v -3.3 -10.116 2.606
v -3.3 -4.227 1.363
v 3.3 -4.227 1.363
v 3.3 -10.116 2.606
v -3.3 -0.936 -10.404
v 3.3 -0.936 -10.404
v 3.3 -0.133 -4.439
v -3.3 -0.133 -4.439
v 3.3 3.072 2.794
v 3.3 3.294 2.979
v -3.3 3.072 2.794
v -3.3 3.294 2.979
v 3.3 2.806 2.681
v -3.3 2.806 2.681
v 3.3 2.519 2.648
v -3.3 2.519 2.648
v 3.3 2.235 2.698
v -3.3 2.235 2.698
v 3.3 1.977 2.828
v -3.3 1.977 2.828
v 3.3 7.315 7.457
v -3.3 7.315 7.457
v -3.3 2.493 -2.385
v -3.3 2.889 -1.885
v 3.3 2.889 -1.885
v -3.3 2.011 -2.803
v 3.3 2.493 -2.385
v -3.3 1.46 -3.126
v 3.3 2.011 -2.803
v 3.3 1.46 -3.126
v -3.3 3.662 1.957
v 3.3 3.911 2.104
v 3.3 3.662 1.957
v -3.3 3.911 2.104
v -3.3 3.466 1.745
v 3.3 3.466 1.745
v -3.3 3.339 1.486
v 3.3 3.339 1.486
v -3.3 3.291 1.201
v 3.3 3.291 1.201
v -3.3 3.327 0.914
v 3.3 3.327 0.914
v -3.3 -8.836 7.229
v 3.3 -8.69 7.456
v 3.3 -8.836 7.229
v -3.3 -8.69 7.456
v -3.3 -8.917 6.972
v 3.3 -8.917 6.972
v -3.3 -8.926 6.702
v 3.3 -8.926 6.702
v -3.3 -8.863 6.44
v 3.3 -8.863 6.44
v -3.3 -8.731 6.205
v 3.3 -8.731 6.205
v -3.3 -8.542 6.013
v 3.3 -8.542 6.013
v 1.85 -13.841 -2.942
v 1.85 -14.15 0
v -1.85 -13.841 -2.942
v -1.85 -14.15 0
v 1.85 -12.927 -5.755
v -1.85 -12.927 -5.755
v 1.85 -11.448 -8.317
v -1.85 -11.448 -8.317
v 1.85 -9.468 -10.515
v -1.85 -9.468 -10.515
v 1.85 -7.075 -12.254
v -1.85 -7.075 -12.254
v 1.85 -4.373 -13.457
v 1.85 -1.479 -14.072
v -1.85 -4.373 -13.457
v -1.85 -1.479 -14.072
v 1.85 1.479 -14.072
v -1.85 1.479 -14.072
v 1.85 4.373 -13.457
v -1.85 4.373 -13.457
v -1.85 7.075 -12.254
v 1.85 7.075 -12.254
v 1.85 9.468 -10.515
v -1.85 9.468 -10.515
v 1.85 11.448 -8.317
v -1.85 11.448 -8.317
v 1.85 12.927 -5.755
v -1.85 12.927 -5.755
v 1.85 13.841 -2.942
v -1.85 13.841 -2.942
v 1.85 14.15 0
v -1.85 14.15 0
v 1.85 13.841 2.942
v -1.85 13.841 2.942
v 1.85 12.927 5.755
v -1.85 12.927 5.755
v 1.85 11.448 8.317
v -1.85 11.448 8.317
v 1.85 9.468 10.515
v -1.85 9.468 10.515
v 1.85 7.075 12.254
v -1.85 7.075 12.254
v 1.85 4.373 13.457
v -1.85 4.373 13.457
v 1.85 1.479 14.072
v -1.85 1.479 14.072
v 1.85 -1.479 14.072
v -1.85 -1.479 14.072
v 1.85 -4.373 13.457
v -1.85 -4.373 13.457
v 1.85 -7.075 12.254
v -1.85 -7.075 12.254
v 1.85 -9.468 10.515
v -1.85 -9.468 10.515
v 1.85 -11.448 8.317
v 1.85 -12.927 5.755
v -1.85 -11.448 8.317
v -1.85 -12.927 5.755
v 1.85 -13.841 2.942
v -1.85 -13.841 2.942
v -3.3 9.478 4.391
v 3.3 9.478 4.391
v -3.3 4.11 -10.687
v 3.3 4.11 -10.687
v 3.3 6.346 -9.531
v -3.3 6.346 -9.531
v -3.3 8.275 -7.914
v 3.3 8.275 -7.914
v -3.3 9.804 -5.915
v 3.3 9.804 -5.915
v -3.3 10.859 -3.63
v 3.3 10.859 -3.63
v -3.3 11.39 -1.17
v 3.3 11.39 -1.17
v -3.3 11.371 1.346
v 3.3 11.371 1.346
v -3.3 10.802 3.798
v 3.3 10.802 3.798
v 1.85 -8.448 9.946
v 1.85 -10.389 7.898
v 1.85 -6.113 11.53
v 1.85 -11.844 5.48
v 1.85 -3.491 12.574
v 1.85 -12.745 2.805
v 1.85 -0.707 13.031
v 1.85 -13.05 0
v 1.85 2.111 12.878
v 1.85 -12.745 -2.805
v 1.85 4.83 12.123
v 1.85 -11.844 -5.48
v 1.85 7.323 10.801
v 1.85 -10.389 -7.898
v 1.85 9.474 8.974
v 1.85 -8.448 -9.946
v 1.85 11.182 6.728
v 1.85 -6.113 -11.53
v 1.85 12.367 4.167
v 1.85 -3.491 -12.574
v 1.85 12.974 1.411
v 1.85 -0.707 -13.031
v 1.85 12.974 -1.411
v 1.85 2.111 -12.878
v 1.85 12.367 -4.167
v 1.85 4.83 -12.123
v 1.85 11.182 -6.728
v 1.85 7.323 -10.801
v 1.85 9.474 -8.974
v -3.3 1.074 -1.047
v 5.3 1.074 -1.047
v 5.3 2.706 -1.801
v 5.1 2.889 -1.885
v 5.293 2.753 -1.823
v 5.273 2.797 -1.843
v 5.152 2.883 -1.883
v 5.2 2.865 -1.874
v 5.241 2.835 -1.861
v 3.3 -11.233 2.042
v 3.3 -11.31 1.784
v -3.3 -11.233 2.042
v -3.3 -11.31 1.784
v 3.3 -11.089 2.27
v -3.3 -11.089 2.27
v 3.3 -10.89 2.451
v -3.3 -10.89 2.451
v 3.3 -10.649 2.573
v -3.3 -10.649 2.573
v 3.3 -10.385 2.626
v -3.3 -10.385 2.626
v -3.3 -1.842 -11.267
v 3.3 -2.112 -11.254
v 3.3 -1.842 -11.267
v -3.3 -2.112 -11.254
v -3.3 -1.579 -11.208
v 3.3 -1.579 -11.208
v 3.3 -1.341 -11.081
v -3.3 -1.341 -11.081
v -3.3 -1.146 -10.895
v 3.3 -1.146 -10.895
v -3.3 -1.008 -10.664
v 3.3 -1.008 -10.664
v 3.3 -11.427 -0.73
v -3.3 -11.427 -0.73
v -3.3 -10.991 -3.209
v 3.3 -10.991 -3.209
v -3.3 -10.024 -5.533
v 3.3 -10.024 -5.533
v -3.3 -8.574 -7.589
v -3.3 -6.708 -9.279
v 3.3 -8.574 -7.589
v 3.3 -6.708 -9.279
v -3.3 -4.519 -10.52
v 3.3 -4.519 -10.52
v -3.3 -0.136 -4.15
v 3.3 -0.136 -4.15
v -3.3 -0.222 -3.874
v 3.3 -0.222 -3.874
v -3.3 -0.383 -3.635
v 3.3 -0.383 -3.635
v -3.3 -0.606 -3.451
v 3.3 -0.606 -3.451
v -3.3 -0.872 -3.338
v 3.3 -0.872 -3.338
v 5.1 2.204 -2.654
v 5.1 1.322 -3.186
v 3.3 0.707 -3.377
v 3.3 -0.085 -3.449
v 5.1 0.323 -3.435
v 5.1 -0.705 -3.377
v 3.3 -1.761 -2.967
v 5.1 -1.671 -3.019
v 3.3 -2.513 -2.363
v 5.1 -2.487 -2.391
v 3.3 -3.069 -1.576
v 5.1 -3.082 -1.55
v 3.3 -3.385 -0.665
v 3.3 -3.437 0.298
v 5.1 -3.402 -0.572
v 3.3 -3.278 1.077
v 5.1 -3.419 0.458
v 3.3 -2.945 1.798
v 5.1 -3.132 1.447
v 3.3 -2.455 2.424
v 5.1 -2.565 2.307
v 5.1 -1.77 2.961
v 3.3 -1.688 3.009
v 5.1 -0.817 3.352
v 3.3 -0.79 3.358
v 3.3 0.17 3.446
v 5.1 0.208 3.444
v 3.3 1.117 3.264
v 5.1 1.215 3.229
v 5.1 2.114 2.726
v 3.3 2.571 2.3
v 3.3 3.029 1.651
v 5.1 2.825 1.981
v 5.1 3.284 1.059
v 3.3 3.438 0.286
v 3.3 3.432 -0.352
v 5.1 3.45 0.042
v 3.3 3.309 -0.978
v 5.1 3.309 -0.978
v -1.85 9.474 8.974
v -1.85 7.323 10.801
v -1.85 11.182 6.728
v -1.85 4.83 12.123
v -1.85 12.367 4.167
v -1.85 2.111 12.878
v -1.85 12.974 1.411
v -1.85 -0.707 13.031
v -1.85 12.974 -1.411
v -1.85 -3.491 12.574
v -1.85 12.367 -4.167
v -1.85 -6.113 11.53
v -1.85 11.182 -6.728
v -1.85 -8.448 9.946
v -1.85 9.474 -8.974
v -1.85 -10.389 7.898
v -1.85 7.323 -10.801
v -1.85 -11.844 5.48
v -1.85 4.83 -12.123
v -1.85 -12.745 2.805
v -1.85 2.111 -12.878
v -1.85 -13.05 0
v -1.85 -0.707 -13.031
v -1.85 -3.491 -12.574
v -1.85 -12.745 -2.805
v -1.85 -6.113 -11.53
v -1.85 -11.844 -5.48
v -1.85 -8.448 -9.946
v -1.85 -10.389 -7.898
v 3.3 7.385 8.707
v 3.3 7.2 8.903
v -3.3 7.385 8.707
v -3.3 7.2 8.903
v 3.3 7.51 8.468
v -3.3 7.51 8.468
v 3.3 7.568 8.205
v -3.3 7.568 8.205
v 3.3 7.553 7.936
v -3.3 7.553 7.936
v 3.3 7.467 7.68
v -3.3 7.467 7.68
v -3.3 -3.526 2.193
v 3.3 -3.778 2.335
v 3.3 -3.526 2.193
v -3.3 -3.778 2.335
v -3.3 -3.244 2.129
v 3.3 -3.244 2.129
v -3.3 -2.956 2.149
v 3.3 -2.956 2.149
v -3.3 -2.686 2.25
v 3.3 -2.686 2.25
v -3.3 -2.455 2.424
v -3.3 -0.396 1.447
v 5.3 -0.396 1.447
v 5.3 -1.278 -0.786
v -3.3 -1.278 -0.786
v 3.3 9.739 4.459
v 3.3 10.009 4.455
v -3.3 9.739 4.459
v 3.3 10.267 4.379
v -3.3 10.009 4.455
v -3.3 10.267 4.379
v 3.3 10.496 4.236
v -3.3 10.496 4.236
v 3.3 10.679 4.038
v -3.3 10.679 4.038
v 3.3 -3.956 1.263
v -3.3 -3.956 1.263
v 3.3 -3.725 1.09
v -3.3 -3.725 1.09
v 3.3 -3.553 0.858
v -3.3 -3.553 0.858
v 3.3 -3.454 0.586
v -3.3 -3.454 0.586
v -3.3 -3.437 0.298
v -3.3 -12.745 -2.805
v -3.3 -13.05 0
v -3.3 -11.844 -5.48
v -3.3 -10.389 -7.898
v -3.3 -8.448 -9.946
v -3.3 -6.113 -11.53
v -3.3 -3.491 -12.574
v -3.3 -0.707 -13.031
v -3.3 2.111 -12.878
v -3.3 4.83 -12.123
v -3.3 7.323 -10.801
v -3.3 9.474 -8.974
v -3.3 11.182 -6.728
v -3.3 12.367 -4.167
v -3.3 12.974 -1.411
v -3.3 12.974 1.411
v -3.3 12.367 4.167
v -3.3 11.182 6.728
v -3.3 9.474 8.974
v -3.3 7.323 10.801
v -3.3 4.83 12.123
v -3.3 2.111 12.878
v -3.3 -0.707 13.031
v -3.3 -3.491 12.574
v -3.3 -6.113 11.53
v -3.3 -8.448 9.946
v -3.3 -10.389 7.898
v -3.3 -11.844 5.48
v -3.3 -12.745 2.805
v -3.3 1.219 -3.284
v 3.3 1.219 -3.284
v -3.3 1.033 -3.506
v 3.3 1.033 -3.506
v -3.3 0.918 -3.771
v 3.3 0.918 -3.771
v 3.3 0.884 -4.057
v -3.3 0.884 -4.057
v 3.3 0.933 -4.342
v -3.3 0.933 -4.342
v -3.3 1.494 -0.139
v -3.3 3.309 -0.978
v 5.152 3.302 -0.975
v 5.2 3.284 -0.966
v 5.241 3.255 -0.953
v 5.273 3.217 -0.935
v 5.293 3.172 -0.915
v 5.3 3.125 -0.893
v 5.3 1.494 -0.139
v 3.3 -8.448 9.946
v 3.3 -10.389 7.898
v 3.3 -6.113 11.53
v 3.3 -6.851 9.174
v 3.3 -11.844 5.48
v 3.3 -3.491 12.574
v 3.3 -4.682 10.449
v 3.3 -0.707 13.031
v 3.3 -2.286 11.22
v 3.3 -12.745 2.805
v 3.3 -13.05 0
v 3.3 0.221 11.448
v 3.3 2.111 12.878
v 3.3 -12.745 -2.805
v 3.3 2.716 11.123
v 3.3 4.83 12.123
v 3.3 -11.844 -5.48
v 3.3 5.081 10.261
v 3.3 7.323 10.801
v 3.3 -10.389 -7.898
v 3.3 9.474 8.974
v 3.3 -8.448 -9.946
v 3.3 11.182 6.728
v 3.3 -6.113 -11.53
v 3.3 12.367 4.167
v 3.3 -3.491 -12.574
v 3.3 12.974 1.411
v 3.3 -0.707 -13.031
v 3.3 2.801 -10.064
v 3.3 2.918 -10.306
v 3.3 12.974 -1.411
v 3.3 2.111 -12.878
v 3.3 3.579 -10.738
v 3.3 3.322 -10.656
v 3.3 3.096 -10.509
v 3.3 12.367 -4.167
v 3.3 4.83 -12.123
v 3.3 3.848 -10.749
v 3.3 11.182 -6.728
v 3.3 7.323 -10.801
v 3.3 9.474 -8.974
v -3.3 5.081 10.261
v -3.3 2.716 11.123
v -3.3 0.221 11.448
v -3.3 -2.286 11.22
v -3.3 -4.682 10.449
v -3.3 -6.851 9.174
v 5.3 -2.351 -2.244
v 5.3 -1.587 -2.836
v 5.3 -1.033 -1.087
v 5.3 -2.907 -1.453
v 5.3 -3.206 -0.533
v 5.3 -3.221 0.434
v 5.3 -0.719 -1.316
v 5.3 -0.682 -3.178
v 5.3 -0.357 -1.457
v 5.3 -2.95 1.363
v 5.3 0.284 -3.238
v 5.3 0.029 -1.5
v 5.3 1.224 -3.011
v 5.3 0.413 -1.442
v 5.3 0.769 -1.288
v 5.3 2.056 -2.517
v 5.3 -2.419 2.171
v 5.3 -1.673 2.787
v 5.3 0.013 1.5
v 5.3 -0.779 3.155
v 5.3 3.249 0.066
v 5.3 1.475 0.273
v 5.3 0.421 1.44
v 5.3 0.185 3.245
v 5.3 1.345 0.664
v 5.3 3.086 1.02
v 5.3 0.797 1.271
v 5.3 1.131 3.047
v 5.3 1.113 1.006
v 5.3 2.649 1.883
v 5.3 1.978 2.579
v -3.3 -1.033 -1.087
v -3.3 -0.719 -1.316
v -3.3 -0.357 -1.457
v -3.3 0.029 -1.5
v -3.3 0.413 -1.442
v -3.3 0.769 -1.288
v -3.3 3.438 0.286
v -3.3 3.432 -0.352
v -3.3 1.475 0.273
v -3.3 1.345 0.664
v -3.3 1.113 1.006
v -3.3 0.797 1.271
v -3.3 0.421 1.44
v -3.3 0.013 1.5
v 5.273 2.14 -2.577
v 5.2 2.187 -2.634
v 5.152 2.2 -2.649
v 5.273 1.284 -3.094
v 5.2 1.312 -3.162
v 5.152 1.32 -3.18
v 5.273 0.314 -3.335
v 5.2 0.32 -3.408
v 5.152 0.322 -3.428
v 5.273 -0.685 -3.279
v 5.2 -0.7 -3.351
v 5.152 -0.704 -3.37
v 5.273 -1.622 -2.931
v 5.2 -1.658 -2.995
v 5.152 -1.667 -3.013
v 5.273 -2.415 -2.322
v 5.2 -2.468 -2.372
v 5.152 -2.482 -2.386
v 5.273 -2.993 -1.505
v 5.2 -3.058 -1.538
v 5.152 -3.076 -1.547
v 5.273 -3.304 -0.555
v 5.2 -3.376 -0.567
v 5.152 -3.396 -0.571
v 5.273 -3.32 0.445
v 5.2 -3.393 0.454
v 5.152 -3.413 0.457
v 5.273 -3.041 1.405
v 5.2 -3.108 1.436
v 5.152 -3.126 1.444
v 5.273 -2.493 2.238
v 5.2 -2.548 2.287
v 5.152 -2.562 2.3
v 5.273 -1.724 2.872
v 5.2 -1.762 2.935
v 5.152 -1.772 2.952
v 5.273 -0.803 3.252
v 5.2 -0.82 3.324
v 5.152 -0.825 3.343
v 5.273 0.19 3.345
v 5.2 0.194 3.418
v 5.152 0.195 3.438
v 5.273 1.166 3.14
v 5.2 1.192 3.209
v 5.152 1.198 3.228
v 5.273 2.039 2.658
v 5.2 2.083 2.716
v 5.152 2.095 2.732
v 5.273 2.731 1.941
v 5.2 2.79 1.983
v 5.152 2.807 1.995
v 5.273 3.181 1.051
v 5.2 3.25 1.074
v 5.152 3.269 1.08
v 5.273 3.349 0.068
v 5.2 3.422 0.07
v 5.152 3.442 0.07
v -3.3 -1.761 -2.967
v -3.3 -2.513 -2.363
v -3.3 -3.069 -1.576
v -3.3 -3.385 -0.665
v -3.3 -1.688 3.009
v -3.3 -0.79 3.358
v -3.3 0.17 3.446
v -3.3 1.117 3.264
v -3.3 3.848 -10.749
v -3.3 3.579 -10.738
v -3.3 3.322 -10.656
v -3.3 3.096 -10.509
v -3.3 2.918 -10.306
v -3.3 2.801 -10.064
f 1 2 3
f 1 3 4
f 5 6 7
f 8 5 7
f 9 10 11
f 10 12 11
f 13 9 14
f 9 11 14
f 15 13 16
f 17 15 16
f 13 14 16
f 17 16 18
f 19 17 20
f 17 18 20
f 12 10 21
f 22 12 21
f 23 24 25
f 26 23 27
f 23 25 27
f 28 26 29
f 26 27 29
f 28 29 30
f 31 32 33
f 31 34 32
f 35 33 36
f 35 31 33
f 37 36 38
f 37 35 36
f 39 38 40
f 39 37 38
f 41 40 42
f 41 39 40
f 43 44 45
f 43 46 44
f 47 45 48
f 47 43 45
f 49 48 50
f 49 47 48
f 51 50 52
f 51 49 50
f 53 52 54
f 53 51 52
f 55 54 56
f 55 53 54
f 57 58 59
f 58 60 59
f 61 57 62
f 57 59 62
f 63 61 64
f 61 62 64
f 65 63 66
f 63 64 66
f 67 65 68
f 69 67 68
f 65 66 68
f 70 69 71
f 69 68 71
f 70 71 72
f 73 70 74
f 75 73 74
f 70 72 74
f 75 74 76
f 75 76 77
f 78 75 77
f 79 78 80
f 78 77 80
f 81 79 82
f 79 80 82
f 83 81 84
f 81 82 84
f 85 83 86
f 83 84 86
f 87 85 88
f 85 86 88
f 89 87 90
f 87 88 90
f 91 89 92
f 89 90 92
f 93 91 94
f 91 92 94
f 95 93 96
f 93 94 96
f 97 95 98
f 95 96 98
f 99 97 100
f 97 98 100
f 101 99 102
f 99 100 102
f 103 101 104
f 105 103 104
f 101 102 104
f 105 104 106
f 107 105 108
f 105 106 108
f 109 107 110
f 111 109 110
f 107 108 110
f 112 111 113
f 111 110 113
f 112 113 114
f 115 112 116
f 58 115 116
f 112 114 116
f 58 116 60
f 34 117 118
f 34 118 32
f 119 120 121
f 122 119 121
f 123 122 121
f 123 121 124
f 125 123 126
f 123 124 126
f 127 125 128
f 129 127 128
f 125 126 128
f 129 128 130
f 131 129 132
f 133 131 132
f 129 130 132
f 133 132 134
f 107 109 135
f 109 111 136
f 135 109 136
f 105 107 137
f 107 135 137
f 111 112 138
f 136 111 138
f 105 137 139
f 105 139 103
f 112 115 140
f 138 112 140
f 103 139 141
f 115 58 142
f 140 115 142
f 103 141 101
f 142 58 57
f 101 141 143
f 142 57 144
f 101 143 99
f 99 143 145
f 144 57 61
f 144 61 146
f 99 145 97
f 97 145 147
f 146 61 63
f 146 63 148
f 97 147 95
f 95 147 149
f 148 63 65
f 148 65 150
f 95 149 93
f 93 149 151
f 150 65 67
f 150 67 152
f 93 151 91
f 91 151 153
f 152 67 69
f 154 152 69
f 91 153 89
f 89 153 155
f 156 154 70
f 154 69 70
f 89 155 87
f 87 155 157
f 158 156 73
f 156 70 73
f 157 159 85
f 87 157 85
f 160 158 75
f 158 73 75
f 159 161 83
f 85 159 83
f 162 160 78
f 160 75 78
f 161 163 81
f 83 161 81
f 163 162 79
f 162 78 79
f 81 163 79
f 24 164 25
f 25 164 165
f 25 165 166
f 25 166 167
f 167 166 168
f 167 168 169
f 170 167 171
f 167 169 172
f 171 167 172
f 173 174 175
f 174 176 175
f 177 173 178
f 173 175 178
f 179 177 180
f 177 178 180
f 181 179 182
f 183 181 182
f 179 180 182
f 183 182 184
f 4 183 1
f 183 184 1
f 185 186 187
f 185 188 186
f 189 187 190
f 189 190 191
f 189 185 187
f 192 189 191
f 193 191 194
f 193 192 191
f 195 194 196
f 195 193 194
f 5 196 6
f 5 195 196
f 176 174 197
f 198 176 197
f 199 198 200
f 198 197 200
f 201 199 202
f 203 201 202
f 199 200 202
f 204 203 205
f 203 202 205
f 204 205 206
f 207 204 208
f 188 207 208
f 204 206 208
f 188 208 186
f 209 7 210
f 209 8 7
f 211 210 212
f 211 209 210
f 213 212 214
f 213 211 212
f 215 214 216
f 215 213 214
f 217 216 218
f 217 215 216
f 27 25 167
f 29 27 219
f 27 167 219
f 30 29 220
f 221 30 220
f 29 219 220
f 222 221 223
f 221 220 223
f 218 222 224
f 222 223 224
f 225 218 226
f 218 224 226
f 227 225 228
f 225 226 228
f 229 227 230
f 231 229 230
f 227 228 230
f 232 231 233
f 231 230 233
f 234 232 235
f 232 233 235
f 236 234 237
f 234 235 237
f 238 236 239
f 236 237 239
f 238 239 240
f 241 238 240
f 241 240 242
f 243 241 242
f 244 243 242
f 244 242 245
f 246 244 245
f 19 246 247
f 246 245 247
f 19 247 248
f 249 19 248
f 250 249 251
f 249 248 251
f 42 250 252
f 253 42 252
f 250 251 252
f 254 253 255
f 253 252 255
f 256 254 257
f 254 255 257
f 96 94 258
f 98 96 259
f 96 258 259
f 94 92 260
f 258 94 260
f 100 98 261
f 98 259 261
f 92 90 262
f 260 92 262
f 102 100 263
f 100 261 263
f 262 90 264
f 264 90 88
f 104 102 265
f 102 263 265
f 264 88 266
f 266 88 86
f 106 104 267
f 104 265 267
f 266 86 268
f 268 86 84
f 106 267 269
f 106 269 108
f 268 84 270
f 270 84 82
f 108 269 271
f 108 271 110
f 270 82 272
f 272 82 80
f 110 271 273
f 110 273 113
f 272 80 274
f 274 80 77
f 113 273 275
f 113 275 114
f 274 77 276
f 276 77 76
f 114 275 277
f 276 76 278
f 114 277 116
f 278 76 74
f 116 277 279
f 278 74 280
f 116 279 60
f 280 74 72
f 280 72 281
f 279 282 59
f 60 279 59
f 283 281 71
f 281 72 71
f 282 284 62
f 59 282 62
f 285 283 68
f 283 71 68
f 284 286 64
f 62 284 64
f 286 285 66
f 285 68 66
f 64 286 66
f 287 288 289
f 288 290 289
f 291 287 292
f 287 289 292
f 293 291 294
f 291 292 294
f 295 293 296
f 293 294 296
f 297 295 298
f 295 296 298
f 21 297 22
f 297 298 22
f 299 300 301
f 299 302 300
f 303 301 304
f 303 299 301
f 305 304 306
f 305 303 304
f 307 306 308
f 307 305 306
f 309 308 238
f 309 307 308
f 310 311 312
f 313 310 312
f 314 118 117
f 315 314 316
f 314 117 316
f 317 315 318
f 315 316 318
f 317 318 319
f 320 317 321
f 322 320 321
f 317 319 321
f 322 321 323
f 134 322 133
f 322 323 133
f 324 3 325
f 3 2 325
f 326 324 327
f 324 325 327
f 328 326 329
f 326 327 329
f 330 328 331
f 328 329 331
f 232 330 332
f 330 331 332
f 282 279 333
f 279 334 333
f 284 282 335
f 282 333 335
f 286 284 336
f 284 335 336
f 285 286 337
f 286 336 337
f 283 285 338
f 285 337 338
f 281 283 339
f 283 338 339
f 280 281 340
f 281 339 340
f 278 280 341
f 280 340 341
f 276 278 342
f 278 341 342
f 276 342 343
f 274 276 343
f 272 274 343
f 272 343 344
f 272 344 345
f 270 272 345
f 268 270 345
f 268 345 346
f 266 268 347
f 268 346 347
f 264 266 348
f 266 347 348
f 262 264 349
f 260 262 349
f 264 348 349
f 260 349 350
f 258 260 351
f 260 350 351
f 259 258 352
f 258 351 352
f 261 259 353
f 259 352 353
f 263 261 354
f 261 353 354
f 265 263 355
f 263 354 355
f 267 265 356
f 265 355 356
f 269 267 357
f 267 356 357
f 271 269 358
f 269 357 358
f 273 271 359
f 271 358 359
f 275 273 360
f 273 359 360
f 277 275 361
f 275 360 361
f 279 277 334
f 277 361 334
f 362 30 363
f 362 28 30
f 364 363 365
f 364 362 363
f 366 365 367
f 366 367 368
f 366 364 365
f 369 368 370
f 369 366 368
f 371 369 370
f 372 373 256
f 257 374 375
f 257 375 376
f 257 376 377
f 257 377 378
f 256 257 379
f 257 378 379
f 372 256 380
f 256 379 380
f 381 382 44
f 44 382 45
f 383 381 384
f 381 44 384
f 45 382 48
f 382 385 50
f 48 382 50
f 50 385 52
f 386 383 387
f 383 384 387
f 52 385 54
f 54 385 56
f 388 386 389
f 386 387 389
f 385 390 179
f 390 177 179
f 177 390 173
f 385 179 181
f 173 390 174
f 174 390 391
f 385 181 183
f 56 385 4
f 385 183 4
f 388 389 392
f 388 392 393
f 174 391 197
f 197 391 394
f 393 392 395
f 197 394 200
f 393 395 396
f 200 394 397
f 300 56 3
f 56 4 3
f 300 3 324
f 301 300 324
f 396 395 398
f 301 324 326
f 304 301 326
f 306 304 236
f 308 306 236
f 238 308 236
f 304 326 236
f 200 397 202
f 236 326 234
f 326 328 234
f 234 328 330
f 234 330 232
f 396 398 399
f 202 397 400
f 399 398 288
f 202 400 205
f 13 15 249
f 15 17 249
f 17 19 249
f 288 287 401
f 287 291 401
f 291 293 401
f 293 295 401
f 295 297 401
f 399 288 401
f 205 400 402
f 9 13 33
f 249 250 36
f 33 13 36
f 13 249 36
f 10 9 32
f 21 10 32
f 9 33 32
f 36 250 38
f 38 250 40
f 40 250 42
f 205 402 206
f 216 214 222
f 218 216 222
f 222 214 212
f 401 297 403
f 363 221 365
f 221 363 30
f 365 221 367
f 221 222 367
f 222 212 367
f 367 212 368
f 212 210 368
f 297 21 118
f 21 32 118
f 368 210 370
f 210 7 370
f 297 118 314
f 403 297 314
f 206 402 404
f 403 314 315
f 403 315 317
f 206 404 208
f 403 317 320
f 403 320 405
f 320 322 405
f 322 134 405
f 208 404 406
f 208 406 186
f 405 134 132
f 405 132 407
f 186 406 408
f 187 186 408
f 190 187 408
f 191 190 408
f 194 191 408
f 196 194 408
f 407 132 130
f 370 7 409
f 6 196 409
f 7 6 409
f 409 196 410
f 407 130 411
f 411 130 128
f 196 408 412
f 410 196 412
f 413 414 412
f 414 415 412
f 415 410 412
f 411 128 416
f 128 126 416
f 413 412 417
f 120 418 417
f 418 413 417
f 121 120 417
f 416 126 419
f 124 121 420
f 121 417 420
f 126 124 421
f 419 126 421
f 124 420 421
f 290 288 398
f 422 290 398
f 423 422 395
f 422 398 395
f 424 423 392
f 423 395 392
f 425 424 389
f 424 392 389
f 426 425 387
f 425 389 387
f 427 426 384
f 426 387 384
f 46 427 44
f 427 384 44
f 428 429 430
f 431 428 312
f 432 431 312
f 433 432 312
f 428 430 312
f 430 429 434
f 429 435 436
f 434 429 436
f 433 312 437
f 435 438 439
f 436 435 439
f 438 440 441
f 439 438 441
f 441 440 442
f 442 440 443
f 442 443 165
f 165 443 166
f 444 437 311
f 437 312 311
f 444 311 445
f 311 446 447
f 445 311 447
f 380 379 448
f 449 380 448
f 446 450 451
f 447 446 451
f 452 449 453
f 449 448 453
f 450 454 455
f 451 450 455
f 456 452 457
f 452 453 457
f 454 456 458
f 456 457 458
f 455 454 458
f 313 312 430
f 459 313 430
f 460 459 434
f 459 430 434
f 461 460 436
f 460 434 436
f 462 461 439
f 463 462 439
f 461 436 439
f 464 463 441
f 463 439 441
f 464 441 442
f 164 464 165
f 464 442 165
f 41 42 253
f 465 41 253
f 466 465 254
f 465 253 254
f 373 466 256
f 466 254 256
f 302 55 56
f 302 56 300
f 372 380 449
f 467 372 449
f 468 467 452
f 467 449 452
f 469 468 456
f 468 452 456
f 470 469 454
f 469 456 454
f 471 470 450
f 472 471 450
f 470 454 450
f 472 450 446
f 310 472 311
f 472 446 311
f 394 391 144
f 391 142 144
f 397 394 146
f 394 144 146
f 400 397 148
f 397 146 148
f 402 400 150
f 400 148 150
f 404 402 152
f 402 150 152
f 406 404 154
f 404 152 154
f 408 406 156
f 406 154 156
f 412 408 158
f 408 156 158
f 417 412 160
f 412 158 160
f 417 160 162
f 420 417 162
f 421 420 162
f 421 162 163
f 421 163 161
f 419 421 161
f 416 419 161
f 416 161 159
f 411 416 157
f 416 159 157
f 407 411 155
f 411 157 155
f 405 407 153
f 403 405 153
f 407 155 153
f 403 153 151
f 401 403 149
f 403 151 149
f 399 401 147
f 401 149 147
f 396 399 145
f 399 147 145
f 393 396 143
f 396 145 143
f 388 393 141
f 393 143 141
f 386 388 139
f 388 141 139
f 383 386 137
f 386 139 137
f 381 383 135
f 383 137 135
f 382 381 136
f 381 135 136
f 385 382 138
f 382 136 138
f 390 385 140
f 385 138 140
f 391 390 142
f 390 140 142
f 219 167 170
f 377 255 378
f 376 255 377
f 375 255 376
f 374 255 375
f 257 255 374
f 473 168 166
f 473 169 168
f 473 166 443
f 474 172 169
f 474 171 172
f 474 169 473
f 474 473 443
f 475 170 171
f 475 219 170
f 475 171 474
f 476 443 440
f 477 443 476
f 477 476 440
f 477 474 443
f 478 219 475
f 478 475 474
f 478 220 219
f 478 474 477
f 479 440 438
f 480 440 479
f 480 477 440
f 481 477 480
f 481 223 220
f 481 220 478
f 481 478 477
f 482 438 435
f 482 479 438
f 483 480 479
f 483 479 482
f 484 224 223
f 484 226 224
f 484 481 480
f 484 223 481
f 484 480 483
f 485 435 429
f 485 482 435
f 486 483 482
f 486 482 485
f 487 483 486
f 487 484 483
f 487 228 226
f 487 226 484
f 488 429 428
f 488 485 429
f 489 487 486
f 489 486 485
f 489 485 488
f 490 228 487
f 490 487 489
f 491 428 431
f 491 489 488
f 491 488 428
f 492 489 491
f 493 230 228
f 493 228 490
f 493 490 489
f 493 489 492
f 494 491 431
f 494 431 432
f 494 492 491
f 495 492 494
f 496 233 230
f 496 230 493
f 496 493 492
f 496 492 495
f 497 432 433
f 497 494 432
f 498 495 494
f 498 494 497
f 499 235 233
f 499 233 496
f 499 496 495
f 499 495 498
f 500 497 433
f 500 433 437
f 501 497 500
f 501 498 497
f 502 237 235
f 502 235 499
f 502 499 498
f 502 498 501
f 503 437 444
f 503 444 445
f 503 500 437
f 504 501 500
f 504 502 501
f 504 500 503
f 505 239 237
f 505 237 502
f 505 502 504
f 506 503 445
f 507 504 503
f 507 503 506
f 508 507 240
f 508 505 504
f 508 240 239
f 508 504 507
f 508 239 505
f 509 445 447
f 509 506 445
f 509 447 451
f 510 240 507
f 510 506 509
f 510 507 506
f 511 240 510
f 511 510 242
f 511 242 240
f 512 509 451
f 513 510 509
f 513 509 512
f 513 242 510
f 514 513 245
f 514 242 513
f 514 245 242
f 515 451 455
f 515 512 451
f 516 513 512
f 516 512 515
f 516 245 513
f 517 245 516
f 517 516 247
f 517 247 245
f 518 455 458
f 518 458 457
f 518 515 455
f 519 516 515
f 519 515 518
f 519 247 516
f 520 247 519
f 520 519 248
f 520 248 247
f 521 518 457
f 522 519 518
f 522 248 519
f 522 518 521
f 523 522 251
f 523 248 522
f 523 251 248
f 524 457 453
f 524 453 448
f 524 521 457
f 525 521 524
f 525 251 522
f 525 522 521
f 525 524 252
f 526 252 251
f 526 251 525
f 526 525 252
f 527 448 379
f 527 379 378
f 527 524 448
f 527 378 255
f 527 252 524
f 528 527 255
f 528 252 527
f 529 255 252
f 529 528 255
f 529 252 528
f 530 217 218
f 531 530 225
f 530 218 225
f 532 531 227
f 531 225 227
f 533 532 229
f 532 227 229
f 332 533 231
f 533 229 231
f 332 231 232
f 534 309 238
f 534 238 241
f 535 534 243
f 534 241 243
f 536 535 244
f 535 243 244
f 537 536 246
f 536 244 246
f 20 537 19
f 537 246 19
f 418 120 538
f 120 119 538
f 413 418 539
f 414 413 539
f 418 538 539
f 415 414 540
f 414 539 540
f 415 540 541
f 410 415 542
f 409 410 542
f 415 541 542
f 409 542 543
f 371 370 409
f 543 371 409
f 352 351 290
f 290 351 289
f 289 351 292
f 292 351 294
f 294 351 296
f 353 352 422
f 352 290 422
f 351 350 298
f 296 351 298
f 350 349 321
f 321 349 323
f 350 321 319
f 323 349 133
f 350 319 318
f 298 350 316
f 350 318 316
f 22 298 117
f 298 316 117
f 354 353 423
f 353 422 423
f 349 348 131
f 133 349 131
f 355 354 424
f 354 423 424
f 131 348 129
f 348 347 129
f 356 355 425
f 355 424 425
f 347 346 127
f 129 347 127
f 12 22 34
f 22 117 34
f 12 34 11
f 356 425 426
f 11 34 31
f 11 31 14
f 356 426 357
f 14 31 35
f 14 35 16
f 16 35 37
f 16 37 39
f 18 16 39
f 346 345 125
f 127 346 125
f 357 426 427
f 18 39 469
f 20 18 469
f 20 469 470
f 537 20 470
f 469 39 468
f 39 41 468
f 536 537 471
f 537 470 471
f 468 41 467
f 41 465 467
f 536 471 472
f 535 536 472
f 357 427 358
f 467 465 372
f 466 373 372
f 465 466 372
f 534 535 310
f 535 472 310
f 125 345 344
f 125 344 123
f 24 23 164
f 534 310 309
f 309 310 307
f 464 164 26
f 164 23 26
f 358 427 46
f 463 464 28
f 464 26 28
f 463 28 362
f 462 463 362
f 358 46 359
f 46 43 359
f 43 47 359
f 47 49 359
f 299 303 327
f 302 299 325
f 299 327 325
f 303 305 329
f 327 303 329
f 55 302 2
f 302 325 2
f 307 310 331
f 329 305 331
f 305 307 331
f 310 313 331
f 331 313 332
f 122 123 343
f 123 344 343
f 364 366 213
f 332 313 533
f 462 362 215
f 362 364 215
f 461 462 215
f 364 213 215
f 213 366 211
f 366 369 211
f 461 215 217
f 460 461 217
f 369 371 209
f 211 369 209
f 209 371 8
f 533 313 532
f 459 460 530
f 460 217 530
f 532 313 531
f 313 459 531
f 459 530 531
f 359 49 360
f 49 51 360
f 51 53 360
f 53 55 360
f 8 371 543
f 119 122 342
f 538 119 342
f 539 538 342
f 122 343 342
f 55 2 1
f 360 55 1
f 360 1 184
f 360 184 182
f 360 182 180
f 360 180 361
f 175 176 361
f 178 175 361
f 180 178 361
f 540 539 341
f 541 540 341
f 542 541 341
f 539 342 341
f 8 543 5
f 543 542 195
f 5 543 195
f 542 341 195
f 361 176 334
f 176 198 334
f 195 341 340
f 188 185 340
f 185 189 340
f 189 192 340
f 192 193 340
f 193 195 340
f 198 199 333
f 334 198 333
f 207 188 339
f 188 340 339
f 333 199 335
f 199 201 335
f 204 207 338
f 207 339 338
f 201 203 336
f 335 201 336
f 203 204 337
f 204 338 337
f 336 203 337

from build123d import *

# Parameters (mm, degrees)
ODEBRAT_VYSUNUT_M1_DEPTH = 10
ZAOBLIT1_R               = 1
ZAOBLIT2_R               = 1
ZAOBLIT4_R               = 1
ODEBRAT_VYSUNUT_M2_DEPTH = 10
P_IDAT_START             = 2
P_IDAT_VYSUNUT_M1_DEPTH  = 2
ZAOBLIT5_R               = 0.2


with BuildPart() as part:
    # Skica1 → Rotovat1 (revolve)
    with BuildSketch(Plane.XY, mode=Mode.PRIVATE) as rotovat1_sk:
        Polygon((1.849988347, 14.15), (-1.849988347, 14.15), (-1.849988347, 13.05), (-3.3, 13.05), (-3.3, 0), (3.3, 0), (3.3, 13.05), (1.849988347, 13.05), align=None)
    revolve(rotovat1_sk.sketch.rotate(Axis((-3.3, 0, 0), (1, 0, 0)), 180), axis=Axis((-3.3, 0, 0), (1, 0, 0)))

    # Skica2 → Odebrat vysunutím1 (cut)
    with BuildSketch(Plane(origin=(3.3, 0, 0), x_dir=(0, 0, -1), z_dir=(1, 0, 0))):
        with BuildLine():
            ThreePointArc((-1.725, 2.987787643), (1.446819914, 3.131966177), (3.393206272, 0.623418956))
            Line((3.393206272, 0.623418956), (11.018835658, 3.112516786))
            ThreePointArc((11.018835658, 3.112516786), (4.801764642, 10.394496444), (-4.773151875, 10.407666462))
            Line((-4.773151875, 10.407666462), (-1.725, 2.987787643))
        make_face()
        with BuildLine():
            ThreePointArc((-1.725, -2.987787643), (-3.43577223, -0.313000288), (-2.236499789, 2.626893354))
            Line((-2.236499789, 2.626893354), (-8.204936435, 7.986333207))
            ThreePointArc((-8.204936435, 7.986333207), (-11.402780301, -1.038798059), (-6.626727613, -9.33750401))
            Line((-6.626727613, -9.33750401), (-1.725, -2.987787643))
        make_face()
        with BuildLine():
            Line((11.399879487, -1.070162452), (3.45, 0))
            ThreePointArc((3.45, 0), (1.988952316, -2.818965889), (-1.156706483, -3.25031231))
            Line((-1.156706483, -3.25031231), (-2.813899223, -11.098849993))
            ThreePointArc((-2.813899223, -11.098849993), (6.601015659, -9.355698385), (11.399879487, -1.070162452))
        make_face()
    extrude(amount=-ODEBRAT_VYSUNUT_M1_DEPTH, mode=Mode.SUBTRACT)

    # Zaoblit1
    zaoblit1_edges = [part.edges().sort_by_distance(p)[0] for p in [
        (0, 7.986333207, 8.204936435),
    ]]
    fillet(zaoblit1_edges, radius=ZAOBLIT1_R)

    # Zaoblit2
    zaoblit2_edges = [part.edges().sort_by_distance(p)[0] for p in [
        (0, 10.407666462, 4.773151875),
        (0, 3.112516786, -11.018835658),
        (0, -9.33750401, 6.626727613),
        (0, -1.070162452, -11.399879487),
        (0, -11.098849993, 2.813899223),
    ]]
    fillet(zaoblit2_edges, radius=ZAOBLIT2_R)

    # Zaoblit4
    zaoblit4_edges = [part.edges().sort_by_distance(p)[0] for p in [
        (0, 0.623418956, -3.393206272),
        (0, 2.987787643, 1.725),
        (0, 2.626893354, 2.236499789),
        (0, -2.987787643, 1.725),
        (0, -3.25031231, 1.156706483),
        (0, 0, -3.45),
    ]]
    fillet(zaoblit4_edges, radius=ZAOBLIT4_R)

    # Skica3 → Odebrat vysunutím2 (cut)
    with BuildSketch(Plane(origin=(3.3, 0, 0), x_dir=(0, 0, -1), z_dir=(1, 0, 0))):
        with BuildLine():
            Line((1.046984184, 1.074162054), (1.885452924, 2.889215684))
            ThreePointArc((1.885452924, 2.889215684), (1.446819914, 3.131966177), (0.977636641, 3.308583775))
            Line((0.977636641, 3.308583775), (0.1391679, 1.493530146))
            ThreePointArc((0.1391679, 1.493530146), (-1.149085352, 0.964159143), (-1.446658447, -0.396458495))
            Line((-1.446658447, -0.396458495), (0.78566452, -1.277783731))
            ThreePointArc((0.78566452, -1.277783731), (1.490826134, -0.165642502), (1.046984184, 1.074162054))
        make_face()
    extrude(amount=-ODEBRAT_VYSUNUT_M2_DEPTH, mode=Mode.SUBTRACT)

    # Skica5 → Přidat vysunutím1 (add)
    with BuildSketch(Plane(origin=(3.3, 0, 0), x_dir=(0, 0, -1), z_dir=(1, 0, 0)).offset(P_IDAT_START)):
        with BuildLine():
            Line((0.977636641, 3.308583775), (0.1391679, 1.493530146))
            ThreePointArc((0.1391679, 1.493530146), (-1.149085352, 0.964159143), (-1.446658447, -0.396458495))
            Line((-1.446658447, -0.396458495), (0.78566452, -1.277783731))
            ThreePointArc((0.78566452, -1.277783731), (1.490826134, -0.165642502), (1.046984184, 1.074162054))
            Line((1.046984184, 1.074162054), (1.885452924, 2.889215684))
            ThreePointArc((1.885452924, 2.889215684), (-1.446819914, -3.131966177), (0.977636641, 3.308583775))
        make_face()
    extrude(amount=-P_IDAT_VYSUNUT_M1_DEPTH)

    # Zaoblit5
    zaoblit5_edges = [part.edges().sort_by_distance(p)[0] for p in [
        (5.3, -3.131966177, 1.446819914),
    ]]
    fillet(zaoblit5_edges, radius=ZAOBLIT5_R)


solid = part.part
